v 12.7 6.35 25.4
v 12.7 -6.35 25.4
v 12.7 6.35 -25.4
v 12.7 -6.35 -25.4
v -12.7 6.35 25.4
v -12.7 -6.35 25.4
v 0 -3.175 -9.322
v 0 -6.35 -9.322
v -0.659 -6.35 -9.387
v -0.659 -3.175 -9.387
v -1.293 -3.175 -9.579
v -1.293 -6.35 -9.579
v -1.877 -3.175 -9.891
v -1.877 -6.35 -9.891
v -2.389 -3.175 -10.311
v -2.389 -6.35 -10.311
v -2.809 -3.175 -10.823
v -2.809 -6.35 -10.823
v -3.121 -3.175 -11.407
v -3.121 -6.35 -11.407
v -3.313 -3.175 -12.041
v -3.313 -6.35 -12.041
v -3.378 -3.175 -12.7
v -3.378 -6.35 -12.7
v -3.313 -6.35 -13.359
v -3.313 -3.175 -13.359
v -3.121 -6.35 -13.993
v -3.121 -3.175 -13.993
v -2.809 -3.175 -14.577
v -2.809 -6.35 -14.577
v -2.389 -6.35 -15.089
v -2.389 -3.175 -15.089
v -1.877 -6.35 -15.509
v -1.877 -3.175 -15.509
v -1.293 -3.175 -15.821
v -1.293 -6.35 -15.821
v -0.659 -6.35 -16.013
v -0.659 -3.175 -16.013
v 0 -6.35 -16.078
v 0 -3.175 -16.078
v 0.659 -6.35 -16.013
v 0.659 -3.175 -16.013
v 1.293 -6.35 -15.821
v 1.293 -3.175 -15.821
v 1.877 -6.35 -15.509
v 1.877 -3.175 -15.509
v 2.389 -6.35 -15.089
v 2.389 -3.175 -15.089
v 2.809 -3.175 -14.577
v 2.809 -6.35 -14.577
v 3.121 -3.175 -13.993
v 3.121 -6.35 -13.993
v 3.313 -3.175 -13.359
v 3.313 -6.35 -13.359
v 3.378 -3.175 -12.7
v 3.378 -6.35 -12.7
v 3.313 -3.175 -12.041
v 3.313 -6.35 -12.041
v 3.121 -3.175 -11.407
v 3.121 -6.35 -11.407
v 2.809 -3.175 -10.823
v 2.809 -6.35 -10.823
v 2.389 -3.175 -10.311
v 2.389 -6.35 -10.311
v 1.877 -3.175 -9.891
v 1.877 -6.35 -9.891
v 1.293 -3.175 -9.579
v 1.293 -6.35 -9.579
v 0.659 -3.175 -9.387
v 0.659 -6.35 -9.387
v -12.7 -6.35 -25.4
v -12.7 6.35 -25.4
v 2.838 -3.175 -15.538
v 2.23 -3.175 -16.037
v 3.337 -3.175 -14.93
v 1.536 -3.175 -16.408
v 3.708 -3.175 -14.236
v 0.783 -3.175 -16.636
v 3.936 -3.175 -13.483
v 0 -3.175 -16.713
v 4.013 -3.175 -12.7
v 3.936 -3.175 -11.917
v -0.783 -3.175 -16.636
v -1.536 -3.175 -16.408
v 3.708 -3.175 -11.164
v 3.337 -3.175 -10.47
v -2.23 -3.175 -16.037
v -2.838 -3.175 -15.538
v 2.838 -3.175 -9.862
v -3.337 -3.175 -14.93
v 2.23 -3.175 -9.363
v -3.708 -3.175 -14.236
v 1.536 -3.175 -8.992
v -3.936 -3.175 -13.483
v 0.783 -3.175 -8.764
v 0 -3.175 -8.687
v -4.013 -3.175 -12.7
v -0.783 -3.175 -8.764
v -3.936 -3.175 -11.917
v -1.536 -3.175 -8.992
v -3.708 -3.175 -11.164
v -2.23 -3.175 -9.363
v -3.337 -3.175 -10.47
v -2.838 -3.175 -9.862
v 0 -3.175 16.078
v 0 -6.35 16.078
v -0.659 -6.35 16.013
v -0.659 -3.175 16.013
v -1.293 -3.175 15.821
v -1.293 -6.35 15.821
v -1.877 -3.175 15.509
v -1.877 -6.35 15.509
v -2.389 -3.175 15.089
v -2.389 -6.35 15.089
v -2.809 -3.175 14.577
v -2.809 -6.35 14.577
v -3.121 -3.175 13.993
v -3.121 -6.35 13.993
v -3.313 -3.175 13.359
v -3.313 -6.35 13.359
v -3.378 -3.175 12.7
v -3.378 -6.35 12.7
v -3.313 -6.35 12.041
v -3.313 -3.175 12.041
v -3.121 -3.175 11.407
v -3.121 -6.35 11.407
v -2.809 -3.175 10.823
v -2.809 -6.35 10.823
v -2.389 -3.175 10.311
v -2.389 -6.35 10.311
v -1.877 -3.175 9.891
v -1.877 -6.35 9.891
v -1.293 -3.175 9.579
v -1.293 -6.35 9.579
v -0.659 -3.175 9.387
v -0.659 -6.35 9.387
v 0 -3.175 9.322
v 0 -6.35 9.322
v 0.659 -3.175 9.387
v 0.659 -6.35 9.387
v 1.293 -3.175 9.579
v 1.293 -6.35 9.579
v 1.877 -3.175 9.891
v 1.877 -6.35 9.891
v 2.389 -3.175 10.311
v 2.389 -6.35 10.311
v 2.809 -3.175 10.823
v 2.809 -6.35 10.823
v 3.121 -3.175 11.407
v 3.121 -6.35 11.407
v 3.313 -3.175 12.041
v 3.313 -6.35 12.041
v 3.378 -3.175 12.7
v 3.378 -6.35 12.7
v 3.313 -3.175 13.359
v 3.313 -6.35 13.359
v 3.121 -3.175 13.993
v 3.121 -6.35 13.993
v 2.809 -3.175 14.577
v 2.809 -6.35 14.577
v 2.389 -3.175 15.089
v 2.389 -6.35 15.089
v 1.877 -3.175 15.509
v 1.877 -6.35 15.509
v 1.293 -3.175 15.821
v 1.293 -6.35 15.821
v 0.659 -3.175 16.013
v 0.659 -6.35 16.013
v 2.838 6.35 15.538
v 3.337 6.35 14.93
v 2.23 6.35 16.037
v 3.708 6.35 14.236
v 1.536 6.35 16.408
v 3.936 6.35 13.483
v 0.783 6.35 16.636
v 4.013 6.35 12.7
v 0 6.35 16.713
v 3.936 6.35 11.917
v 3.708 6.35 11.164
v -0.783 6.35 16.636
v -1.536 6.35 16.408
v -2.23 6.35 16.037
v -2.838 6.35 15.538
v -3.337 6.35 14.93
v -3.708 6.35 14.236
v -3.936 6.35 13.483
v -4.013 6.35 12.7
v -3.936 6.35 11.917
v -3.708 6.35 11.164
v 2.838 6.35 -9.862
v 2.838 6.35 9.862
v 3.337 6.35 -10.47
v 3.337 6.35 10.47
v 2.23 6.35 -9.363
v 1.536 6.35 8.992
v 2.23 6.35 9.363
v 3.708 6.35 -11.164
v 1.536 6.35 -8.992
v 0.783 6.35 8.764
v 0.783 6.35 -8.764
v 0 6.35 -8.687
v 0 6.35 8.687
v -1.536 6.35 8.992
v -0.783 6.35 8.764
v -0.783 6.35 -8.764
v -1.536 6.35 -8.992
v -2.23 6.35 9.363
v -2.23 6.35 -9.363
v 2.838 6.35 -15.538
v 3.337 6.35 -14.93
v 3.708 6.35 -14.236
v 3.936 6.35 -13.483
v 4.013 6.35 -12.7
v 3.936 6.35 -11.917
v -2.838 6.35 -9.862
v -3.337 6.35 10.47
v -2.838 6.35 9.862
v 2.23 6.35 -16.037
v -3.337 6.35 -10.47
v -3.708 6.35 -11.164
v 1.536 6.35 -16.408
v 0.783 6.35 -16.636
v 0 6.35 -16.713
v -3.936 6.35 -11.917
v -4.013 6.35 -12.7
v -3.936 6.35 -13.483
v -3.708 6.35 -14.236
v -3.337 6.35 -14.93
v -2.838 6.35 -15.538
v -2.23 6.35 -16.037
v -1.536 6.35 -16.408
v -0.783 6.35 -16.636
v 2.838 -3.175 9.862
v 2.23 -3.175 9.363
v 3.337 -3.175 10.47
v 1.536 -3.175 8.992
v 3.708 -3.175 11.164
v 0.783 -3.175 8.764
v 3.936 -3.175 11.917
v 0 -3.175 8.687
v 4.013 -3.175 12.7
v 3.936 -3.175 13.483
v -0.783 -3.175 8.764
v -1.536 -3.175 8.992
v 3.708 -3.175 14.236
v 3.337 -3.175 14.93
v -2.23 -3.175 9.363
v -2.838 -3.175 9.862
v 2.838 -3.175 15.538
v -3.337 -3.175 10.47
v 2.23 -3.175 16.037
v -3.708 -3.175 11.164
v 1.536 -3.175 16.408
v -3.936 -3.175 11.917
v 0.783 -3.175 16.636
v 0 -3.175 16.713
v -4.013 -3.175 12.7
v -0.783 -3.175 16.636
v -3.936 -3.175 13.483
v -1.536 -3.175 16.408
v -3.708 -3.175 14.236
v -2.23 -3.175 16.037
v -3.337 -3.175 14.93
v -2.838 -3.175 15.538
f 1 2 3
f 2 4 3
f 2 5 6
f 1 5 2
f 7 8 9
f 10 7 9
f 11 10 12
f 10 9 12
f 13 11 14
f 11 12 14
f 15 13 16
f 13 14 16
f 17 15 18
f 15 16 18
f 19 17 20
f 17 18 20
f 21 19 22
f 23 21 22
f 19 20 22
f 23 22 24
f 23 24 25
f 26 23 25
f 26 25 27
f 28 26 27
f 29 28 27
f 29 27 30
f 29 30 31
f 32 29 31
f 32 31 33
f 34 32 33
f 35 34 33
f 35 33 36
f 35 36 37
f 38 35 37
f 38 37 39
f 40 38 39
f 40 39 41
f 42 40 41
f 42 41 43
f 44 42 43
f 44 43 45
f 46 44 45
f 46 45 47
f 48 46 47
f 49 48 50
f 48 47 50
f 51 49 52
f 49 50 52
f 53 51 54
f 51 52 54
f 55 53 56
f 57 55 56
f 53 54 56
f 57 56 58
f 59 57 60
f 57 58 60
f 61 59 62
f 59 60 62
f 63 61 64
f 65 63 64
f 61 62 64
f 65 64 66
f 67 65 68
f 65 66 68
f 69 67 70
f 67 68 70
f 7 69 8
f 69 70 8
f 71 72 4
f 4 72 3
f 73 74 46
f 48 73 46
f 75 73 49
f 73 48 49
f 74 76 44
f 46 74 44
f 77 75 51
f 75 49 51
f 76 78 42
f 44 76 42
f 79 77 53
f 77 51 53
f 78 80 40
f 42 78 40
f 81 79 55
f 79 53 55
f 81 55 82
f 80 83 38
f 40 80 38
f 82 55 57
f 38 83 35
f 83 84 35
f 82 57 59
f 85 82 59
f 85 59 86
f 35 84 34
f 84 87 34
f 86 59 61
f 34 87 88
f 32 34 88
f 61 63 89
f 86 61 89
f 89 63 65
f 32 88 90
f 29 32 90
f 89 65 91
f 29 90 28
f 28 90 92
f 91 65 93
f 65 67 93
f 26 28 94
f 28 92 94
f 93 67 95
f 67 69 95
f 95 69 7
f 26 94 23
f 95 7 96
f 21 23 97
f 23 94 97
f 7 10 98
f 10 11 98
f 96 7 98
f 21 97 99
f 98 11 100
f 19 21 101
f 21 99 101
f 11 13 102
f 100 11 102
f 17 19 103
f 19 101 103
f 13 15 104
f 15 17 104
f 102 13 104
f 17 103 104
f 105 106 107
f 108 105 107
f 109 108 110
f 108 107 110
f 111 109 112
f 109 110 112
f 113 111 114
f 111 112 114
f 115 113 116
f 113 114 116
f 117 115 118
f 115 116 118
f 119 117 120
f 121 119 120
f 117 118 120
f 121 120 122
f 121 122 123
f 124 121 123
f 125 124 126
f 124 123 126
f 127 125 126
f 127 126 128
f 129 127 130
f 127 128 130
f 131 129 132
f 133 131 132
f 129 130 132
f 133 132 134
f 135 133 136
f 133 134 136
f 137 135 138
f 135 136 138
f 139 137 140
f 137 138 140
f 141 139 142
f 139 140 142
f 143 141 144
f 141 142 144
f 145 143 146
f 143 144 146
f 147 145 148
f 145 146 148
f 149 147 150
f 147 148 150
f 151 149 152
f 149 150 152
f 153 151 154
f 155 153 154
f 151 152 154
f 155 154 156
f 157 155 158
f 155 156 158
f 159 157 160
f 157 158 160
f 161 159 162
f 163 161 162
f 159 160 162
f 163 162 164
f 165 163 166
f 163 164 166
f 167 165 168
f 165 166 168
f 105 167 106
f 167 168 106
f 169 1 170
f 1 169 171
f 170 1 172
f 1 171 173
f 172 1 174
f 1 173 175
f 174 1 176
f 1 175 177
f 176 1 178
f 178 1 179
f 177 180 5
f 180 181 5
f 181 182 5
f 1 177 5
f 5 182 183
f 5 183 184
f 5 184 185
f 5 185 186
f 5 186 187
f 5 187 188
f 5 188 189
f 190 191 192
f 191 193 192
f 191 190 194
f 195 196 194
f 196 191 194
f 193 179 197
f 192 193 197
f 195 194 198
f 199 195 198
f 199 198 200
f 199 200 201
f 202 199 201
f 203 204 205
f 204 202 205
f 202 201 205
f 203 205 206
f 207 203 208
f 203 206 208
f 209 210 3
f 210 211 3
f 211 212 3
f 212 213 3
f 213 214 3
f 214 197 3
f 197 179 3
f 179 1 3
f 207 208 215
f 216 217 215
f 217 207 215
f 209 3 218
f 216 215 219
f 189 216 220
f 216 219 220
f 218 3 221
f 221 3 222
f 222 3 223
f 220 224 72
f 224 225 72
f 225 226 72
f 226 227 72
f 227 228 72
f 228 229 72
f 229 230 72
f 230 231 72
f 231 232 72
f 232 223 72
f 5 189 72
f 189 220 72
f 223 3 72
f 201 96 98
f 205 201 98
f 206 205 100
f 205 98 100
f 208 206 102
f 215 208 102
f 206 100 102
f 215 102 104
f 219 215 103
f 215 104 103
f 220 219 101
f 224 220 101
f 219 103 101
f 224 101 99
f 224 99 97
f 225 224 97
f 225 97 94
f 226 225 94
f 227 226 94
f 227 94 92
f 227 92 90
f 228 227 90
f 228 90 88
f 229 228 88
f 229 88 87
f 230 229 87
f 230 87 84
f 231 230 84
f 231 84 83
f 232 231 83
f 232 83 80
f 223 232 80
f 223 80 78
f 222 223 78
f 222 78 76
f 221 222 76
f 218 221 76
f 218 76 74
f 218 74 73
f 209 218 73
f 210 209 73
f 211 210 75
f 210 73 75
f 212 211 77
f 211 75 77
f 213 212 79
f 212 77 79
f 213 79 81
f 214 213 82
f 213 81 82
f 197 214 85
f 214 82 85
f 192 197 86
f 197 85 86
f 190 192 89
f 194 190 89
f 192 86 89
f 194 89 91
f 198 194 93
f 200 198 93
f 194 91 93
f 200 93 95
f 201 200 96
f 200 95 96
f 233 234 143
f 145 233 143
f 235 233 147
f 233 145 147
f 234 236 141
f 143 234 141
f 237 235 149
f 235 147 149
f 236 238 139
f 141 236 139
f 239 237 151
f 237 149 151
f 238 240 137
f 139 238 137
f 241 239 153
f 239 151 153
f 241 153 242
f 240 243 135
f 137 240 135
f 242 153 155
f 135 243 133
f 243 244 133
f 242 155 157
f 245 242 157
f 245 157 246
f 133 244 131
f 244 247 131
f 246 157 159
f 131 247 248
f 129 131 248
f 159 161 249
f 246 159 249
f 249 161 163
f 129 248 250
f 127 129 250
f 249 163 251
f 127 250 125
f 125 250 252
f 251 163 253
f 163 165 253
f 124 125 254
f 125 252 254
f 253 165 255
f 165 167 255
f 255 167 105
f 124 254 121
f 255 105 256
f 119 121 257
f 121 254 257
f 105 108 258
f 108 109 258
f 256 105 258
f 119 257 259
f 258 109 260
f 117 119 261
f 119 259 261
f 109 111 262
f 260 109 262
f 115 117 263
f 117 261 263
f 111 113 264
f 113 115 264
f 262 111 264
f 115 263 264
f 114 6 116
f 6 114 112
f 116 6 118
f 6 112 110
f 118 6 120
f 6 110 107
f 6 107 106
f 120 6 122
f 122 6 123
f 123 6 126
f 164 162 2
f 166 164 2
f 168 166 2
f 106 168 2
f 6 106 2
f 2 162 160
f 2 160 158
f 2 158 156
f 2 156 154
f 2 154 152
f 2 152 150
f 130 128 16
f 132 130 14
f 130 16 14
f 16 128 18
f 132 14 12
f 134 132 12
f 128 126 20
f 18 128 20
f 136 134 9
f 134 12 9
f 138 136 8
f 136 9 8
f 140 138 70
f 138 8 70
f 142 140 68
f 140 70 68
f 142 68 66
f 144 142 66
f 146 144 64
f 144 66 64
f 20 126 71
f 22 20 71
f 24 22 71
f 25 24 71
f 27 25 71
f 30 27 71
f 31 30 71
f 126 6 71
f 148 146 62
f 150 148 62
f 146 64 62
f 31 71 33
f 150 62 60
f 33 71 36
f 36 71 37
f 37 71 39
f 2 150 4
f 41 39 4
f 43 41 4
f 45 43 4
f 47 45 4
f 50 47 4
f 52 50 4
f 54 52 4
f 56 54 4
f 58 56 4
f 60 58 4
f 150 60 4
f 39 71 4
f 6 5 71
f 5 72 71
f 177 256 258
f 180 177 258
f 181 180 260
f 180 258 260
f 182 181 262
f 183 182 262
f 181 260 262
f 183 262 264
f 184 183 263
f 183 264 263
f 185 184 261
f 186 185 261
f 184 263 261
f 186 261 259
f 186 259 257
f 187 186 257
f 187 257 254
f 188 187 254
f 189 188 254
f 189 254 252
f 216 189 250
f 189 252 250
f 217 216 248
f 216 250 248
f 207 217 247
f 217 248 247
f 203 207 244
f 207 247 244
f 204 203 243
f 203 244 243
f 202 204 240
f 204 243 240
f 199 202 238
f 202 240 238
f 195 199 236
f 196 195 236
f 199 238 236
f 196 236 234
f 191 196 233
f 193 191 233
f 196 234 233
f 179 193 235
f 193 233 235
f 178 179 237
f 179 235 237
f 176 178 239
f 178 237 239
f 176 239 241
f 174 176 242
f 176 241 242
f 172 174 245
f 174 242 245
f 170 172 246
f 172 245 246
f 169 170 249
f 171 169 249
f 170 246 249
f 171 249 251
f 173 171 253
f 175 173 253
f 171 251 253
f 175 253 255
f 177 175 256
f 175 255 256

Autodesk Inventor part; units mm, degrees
ref_plane "YZ Plane" through (0, 0, 0) normal (1, 0, 0) x (0, 1, 0)
ref_plane "XZ Plane" through (0, 0, 0) normal (0, 1, 0) x (-1, 0, 0)
ref_plane "XY Plane" through (0, 0, 0) normal (0, 0, 1) x (1, 0, 0)
sketch "Sketch1" plane through (0, 0, 0) normal (0, 0, 1) x (1, 0, 0)
  line L0 (-12.7, -6.35) -> (12.7, -6.35)
  line L1 (12.7, -6.35) -> (12.7, 6.35)
  line L2 (12.7, 6.35) -> (-12.7, 6.35)
  line L3 (-12.7, 6.35) -> (-12.7, -6.35)
  line L4 (-12.7, -6.35) -> (12.7, 6.35) construction
  line L5 (12.7, -6.35) -> (-12.7, 6.35) construction
  point P0 (0, 0)
  dimension "d0" = 25.4
  dimension "d1" = 12.7
extrude "Extrusion1" add sketch "Sketch1" along normal mid plane 50.8
sketch "Sketch2" plane through (-12.7, 6.35, 25.4) normal (0, 1, 0) x (1, 0, 0)
  line L0 (25.4, 0) -> (0, 0) projected
  line L1 (0, 50.8) -> (25.4, 50.8) projected
  point P0 (12.7, 25.4)
  point P1 (12.7, 12.7)
  point P2 (12.7, 38.1)
  dimension "d11" = 12.7
  dimension "d12" = 12.7
hole "Hole1" at (0, 6.35, 12.7) at (0, 6.35, -12.7) direction (0, -1, 0) diameter 6.7564 end through all counterbore diameter 8.0264 counterbore depth 9.525 clearance for "Hex Head Bolt" size "1/4" standard "Ansi Unified Screw Threads"
properties part number "seatingPartsExample" material "Phenolic Resin"
